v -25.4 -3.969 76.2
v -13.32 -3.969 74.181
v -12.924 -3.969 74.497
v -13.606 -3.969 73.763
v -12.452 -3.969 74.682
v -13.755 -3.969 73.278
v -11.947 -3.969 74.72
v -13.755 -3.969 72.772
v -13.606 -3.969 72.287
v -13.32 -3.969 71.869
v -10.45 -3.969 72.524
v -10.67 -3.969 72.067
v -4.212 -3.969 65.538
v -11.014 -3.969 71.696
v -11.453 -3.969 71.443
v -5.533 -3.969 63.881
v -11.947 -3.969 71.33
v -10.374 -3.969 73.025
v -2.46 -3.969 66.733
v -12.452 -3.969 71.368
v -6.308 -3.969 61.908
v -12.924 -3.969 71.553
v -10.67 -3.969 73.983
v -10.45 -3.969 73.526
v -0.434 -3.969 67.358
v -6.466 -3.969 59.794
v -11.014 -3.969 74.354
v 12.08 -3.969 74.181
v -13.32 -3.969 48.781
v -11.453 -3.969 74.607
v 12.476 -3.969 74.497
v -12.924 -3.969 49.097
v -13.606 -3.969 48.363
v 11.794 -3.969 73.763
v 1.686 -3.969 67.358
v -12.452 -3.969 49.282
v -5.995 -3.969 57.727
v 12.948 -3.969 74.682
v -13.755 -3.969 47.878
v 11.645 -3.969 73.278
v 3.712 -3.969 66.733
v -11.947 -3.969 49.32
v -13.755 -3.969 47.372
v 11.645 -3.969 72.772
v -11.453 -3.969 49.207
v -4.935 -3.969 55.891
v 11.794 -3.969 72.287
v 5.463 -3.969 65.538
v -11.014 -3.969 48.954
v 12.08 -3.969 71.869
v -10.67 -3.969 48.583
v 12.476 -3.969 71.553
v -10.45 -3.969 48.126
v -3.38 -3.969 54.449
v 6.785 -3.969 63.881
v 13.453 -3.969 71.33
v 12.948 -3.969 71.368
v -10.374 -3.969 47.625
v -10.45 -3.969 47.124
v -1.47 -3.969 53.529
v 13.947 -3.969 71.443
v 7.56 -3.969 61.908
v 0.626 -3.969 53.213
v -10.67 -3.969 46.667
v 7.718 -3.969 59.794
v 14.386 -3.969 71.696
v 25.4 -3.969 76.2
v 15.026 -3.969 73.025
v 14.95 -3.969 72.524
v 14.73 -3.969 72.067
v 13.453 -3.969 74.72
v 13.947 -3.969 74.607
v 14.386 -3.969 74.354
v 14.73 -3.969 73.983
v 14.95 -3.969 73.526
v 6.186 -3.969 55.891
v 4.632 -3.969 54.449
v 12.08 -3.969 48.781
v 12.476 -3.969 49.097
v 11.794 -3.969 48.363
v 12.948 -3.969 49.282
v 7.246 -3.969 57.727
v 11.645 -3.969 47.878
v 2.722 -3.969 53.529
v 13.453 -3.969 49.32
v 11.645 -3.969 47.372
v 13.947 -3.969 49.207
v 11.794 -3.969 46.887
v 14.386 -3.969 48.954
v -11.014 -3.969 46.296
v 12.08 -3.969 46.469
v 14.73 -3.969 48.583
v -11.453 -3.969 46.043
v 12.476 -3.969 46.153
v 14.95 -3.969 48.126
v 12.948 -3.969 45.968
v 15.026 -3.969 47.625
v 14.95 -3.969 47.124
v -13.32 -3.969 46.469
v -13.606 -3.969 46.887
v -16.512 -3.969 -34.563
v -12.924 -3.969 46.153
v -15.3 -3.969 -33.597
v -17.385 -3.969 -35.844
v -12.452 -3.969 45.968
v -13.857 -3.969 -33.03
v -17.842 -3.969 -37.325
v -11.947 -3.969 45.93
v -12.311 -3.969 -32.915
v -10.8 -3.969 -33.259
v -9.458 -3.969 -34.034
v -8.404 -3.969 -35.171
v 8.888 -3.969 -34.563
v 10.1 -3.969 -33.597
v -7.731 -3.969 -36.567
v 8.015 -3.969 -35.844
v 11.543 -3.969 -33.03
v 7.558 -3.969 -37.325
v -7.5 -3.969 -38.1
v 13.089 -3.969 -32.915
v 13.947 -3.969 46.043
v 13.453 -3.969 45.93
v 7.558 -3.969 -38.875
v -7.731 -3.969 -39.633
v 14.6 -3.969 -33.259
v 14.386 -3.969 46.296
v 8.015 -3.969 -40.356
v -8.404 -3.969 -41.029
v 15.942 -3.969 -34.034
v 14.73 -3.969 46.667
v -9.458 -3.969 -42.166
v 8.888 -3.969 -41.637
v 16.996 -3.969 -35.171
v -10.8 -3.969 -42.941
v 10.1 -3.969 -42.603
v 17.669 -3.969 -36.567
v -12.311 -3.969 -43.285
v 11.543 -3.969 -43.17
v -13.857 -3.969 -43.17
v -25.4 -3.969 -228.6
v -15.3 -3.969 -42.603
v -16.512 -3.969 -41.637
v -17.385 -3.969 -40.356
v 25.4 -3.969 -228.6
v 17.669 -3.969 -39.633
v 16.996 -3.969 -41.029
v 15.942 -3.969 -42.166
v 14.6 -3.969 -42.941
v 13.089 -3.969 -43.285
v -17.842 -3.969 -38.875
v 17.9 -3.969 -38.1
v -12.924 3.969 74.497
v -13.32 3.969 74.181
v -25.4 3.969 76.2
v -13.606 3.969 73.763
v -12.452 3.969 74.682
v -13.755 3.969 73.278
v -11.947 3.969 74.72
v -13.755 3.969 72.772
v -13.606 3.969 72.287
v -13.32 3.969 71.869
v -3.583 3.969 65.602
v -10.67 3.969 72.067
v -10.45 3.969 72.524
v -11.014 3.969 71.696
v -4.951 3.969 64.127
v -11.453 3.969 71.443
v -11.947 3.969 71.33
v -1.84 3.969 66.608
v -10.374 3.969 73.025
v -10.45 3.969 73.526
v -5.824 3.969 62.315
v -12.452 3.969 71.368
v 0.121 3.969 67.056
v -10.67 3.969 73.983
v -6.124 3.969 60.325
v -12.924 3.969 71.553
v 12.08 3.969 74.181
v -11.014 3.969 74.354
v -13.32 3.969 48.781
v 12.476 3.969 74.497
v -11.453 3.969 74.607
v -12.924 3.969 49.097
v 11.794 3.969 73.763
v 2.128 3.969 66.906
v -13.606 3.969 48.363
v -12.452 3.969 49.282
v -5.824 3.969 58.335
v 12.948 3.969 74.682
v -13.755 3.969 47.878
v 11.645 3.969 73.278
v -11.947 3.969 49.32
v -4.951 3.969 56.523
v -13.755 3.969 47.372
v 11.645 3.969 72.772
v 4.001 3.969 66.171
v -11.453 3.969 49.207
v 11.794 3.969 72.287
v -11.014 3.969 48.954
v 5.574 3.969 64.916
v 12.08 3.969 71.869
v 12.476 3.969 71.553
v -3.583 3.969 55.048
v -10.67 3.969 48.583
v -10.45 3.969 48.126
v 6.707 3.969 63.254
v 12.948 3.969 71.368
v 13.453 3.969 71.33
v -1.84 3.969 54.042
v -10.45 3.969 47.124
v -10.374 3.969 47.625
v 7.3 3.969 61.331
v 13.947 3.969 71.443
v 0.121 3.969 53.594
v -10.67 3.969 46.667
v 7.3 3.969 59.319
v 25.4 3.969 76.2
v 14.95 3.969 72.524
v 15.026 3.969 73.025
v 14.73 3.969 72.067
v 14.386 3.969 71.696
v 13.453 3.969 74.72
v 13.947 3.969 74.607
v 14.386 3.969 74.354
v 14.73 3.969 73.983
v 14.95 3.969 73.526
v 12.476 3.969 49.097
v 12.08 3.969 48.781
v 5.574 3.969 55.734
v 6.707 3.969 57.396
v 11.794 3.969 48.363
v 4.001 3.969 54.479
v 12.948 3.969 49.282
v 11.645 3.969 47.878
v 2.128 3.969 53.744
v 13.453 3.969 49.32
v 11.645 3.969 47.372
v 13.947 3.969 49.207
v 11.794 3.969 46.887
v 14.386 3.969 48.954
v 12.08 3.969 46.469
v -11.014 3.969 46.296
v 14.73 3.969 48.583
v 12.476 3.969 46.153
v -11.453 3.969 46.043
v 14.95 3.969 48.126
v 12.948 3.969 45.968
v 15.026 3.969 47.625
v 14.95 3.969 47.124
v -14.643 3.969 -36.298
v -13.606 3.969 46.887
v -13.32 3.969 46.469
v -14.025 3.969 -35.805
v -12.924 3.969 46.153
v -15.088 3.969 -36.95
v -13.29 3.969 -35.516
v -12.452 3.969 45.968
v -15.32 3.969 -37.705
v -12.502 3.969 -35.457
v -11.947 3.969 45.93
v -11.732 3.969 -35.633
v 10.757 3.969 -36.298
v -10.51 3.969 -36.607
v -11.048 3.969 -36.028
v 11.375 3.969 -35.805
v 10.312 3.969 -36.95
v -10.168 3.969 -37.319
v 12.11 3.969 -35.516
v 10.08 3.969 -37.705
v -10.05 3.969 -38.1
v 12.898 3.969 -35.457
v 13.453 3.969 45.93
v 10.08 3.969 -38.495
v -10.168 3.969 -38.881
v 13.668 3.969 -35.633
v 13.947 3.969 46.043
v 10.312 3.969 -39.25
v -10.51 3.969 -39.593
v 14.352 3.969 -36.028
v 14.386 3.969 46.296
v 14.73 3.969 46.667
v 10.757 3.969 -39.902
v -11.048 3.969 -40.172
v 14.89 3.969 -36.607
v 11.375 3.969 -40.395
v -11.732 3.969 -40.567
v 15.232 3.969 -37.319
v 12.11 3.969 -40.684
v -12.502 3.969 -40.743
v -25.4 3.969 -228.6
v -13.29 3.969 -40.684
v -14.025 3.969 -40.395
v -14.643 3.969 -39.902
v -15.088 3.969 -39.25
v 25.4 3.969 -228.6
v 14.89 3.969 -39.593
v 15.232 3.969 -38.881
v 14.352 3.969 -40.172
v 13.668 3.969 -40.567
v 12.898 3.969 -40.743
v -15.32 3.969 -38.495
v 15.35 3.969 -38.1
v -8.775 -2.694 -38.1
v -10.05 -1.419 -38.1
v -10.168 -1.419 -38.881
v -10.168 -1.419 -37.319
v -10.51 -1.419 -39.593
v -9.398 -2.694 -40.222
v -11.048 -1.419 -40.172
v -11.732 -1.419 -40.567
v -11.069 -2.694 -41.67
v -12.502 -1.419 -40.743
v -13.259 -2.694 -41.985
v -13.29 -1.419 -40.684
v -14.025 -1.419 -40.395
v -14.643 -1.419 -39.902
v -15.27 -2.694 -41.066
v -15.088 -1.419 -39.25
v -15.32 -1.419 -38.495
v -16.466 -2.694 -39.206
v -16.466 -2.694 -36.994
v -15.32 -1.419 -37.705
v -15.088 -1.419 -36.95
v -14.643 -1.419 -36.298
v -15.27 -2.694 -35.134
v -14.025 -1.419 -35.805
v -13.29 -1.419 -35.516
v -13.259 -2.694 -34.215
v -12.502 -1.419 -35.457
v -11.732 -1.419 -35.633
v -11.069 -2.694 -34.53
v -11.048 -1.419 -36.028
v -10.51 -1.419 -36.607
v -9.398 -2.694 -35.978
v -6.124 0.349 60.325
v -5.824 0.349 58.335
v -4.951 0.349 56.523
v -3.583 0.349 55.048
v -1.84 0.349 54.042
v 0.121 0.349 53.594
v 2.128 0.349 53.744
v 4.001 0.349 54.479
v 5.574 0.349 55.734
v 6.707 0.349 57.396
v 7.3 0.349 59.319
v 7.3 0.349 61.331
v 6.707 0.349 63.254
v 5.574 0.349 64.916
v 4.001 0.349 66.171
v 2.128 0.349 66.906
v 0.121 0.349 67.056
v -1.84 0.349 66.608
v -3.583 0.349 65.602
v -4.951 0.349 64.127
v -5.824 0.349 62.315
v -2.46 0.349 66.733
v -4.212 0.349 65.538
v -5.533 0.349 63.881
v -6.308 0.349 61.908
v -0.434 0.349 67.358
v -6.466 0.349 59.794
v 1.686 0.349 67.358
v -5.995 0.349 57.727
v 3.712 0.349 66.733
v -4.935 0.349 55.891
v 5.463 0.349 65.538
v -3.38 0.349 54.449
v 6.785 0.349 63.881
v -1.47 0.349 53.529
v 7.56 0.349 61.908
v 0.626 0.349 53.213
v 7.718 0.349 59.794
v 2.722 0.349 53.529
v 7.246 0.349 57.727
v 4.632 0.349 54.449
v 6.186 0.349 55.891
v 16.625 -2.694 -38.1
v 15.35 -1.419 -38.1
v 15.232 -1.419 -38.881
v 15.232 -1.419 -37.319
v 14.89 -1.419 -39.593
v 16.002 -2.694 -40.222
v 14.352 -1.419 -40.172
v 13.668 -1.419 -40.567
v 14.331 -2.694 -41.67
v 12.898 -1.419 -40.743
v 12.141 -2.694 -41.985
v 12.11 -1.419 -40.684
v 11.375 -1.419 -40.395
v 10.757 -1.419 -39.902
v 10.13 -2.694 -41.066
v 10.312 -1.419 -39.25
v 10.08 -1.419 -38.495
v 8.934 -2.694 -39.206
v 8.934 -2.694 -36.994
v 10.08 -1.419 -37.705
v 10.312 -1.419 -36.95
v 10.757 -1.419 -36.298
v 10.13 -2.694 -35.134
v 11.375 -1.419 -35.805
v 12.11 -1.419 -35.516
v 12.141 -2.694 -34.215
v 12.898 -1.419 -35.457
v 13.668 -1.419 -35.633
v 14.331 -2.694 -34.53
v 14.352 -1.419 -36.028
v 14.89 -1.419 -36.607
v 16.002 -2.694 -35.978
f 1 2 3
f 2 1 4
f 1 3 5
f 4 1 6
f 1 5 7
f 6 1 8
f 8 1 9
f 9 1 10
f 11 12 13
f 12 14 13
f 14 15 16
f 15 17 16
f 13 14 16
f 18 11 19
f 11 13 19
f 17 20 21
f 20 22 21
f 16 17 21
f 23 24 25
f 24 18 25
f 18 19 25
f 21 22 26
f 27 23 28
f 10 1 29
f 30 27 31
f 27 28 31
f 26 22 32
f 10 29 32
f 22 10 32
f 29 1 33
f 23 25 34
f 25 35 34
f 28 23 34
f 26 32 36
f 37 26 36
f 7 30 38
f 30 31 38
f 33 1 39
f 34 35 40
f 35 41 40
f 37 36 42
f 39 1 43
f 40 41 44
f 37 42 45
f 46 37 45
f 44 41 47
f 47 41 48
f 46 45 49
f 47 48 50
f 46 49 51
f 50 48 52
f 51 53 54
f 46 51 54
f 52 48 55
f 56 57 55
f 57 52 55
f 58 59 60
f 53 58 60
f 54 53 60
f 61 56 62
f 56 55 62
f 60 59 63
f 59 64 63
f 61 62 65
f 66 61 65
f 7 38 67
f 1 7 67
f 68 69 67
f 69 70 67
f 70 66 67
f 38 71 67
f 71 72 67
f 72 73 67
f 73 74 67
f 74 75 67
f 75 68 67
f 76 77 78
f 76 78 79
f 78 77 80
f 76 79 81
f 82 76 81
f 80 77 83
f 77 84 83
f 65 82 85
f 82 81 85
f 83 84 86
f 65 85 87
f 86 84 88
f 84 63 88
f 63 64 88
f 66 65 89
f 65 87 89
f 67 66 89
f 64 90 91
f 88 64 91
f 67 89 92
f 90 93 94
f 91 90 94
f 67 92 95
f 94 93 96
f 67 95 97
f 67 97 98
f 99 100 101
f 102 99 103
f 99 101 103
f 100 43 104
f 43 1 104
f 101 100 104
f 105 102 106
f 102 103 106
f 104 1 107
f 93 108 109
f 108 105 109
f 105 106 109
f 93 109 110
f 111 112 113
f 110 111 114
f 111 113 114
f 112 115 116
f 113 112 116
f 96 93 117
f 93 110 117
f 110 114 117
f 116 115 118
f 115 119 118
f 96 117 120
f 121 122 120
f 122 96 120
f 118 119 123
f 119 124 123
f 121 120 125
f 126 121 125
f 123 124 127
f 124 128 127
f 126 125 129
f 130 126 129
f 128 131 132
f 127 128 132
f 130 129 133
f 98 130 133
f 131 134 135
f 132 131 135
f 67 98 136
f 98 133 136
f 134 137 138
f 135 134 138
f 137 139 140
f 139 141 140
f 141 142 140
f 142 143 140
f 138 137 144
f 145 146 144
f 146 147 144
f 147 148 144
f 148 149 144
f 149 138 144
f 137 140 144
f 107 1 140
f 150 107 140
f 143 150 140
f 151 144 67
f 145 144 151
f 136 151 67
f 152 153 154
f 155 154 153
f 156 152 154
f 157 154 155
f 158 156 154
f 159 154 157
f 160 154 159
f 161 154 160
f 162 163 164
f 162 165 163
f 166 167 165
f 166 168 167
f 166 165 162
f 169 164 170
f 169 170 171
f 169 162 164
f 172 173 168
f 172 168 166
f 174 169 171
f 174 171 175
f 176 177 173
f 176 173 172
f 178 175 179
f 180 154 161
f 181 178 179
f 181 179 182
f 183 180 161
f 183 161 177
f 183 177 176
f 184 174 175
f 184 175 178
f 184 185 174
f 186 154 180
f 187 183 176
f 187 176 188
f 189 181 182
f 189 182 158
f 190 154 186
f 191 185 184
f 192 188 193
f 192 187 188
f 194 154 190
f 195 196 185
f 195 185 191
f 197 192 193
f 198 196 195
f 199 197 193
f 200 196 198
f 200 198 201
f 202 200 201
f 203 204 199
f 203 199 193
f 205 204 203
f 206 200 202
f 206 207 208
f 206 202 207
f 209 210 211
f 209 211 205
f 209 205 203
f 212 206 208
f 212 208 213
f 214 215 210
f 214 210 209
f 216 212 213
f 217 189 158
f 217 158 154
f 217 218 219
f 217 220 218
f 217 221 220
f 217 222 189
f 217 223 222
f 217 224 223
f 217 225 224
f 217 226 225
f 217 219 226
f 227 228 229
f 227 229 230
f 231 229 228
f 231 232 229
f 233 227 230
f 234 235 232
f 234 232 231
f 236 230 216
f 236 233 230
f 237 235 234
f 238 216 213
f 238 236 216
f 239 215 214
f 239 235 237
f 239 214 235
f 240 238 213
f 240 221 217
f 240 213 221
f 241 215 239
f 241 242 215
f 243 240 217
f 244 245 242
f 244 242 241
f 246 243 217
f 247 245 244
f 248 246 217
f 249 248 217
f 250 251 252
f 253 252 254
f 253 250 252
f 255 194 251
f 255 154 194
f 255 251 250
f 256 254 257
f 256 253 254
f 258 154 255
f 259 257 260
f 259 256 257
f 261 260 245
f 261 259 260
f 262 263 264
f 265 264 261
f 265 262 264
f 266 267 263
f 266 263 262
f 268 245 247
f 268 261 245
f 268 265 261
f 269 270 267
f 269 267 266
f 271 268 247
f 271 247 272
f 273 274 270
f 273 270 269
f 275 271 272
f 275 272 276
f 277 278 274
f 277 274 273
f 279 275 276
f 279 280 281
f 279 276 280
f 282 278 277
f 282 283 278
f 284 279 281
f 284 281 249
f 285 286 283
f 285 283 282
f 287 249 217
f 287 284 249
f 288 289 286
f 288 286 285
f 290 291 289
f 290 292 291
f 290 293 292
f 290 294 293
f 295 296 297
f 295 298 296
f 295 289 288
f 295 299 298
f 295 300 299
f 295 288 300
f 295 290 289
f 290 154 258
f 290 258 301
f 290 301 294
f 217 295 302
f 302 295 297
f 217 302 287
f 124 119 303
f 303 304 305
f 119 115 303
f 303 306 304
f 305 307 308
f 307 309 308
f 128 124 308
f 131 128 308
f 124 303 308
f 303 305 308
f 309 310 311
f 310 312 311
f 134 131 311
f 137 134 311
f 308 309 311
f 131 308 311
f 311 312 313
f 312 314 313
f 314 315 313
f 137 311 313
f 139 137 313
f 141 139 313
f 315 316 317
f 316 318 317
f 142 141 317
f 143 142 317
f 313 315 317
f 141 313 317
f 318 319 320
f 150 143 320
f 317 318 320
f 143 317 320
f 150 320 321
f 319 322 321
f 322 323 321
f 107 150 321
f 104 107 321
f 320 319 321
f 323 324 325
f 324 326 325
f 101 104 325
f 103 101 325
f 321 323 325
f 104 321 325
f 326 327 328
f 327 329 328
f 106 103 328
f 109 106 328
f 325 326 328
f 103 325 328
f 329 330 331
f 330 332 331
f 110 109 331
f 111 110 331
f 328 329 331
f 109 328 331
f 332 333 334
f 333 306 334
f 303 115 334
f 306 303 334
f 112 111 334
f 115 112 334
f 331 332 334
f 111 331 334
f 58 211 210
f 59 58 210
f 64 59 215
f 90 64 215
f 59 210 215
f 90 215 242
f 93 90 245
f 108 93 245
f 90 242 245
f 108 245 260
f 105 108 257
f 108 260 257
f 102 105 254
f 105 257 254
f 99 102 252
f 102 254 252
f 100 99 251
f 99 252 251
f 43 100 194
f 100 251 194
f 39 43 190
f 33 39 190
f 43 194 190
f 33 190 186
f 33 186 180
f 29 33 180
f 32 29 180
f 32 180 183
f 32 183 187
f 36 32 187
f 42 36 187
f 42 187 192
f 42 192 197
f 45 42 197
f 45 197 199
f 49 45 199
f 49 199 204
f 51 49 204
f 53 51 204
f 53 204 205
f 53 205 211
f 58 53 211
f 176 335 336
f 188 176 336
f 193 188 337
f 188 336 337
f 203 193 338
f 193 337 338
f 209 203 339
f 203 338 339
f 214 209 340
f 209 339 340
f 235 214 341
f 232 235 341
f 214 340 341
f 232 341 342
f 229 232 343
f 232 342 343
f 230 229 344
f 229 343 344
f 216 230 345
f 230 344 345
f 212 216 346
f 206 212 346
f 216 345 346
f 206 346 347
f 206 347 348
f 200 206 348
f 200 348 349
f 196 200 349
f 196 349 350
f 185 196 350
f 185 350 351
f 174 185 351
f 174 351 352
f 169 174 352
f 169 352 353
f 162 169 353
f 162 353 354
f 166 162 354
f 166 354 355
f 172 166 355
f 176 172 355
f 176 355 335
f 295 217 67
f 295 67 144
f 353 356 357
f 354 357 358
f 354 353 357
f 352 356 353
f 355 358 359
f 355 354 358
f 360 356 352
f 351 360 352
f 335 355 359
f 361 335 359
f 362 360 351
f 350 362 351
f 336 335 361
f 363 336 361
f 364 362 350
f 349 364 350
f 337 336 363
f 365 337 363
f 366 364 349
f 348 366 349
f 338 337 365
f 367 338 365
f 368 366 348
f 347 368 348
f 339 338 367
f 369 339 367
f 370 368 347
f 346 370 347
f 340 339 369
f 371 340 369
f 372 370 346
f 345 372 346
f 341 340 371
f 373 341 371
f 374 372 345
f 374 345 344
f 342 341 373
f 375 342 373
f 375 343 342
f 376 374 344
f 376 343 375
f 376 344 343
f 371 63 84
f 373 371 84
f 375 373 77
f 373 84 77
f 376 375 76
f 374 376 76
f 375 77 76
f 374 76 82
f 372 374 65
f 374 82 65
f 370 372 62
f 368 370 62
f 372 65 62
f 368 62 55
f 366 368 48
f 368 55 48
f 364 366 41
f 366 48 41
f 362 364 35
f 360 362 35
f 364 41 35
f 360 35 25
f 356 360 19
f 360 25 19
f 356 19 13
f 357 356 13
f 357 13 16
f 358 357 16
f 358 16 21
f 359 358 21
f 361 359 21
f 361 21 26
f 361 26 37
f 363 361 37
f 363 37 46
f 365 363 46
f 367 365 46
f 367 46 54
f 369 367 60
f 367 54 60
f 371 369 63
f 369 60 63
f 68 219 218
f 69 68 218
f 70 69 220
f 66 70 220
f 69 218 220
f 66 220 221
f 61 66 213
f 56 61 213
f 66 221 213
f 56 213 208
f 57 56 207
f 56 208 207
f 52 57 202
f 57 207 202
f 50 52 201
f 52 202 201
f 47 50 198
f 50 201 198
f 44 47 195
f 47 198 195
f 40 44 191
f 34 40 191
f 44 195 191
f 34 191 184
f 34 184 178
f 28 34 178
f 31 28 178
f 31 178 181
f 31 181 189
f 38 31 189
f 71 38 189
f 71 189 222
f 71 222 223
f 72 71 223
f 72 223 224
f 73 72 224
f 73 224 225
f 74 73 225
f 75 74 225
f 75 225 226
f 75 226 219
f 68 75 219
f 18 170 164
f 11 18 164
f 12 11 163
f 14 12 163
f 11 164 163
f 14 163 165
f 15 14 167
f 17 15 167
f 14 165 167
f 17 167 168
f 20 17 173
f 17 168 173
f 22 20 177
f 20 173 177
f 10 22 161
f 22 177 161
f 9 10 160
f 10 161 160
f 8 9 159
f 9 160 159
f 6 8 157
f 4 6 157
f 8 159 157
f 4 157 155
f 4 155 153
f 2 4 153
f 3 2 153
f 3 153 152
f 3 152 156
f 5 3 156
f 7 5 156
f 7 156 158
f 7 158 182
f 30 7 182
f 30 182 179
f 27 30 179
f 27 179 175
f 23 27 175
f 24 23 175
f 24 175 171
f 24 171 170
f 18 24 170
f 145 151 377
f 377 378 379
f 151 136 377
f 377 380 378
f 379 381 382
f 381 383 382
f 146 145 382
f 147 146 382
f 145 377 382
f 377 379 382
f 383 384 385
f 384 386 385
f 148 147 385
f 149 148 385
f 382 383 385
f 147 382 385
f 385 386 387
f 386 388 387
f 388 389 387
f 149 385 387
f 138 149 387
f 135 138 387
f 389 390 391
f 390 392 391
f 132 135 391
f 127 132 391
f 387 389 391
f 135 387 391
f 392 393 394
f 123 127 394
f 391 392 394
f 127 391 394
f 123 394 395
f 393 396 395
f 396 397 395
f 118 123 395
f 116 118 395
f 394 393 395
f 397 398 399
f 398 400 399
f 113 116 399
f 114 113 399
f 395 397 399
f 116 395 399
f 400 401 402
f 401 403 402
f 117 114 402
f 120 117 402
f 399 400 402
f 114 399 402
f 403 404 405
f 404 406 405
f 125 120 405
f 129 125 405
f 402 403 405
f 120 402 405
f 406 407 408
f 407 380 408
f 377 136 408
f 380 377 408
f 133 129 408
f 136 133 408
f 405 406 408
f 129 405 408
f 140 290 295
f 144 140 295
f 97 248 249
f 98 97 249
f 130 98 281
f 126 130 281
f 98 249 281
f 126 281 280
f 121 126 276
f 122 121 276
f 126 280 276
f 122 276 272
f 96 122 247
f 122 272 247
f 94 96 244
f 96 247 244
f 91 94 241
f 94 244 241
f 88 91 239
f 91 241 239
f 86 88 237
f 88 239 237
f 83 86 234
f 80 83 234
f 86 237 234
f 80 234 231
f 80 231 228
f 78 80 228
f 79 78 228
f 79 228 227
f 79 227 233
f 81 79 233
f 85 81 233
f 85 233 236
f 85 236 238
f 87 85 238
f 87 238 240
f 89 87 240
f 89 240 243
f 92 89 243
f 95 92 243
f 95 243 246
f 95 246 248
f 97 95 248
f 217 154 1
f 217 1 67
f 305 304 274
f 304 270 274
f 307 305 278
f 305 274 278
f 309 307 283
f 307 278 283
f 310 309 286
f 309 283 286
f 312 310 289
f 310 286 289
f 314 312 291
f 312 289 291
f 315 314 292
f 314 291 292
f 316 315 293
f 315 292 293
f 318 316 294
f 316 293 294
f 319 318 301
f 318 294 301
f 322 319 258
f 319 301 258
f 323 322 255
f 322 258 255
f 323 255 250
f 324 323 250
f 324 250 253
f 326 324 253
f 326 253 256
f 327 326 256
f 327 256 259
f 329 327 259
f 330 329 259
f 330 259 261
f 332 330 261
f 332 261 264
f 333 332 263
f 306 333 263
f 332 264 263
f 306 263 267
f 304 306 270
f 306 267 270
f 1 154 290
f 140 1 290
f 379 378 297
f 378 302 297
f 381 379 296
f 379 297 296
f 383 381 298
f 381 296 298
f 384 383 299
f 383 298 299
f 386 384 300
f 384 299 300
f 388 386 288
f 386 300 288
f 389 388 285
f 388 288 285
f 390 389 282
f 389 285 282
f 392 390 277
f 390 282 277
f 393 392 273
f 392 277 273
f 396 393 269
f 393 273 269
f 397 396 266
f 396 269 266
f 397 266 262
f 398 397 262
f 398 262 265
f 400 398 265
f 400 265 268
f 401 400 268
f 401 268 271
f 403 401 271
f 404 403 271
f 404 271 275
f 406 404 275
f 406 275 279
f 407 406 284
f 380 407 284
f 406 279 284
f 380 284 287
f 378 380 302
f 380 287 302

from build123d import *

# Parameters (mm, degrees)
BOSS_EXTRUDE1_DEPTH                             = 76.2
BOSS_EXTRUDE1_DEPTH_BACK                        = 76.2
SKETCH3_W                                       = 50.8
SKETCH3_H                                       = 7.9375
M12_CLEARANCE_HOLE2_D                           = 13.5
CSK_FOR_M5_FLAT_HEAD_MACHINE_SCREW1_D           = 5.3
CSK_FOR_M5_FLAT_HEAD_MACHINE_SCREW1_CSINK_D     = 10.4
CSK_FOR_M5_FLAT_HEAD_MACHINE_SCREW1_CSINK_ANGLE = 90
SKETCH26_W                                      = 50.8
SKETCH26_H                                      = 152.4
BOSS_EXTRUDE2_DEPTH                             = 7.9375
SKETCH27_R                                      = 7.112
CUT_EXTRUDE2_DEPTH                              = 4.318
M3_CLEARANCE_HOLE1_D                            = 3.4
M3_CLEARANCE_HOLE1_DEPTH                        = 15.24
M3_CLEARANCE_HOLE1_TIP                          = 1.021463052


with BuildPart() as part:
    # Sketch3 → Boss-Extrude1 (new, two sides: drawn at the far end of the back side and taken through both)
    with BuildSketch(Plane.XY.offset(-BOSS_EXTRUDE1_DEPTH_BACK)):
        Rectangle(SKETCH3_W, SKETCH3_H)
    extrude(amount=BOSS_EXTRUDE1_DEPTH + BOSS_EXTRUDE1_DEPTH_BACK)

    # M12 Clearance Hole2 (through all)
    with Locations(Plane(origin=(0, 3.96875, 0), x_dir=(1, 0, 0), z_dir=(0, 1, 0))):
        with Locations((0.625840615, -60.325)):
            Hole(M12_CLEARANCE_HOLE2_D / 2)

    # CSK for M5 Flat Head Machine Screw1 (through all)
    with Locations(Plane(origin=(0, -3.96875, 0), x_dir=(-1, 0, 0), z_dir=(0, -1, 0))):
        with Locations((-12.7, 38.1), (12.7, 38.1)):
            CounterSinkHole(CSK_FOR_M5_FLAT_HEAD_MACHINE_SCREW1_D / 2, CSK_FOR_M5_FLAT_HEAD_MACHINE_SCREW1_CSINK_D / 2, counter_sink_angle=CSK_FOR_M5_FLAT_HEAD_MACHINE_SCREW1_CSINK_ANGLE)

    # Sketch26 → Boss-Extrude2 (add)
    with BuildSketch(Plane(origin=(0, 3.96875, 0), x_dir=(1, 0, 0), z_dir=(0, 1, 0))):
        with Locations((0, 152.4)):
            Rectangle(SKETCH26_W, SKETCH26_H)
    extrude(amount=-BOSS_EXTRUDE2_DEPTH)

    # Sketch27 → Cut-Extrude2 (cut)
    with BuildSketch(Plane.XZ.offset(3.96875)):
        with Locations(Location((0.625840615, 60.325, 0), (0, 0, 270))):
            Circle(SKETCH27_R)
    extrude(amount=-CUT_EXTRUDE2_DEPTH, mode=Mode.SUBTRACT)

    # M3 Clearance Hole1
    with Locations(Plane(origin=(0, -3.96875, 0), x_dir=(-1, 0, 0), z_dir=(0, -1, 0))):
        with Locations((-13.325840615, -47.625), (-13.325840615, -73.025), (12.074159385, -73.025), (12.074159385, -47.625)):
            Hole(M3_CLEARANCE_HOLE1_D / 2, depth=M3_CLEARANCE_HOLE1_DEPTH)
            with Locations((0, 0, -(M3_CLEARANCE_HOLE1_DEPTH + M3_CLEARANCE_HOLE1_TIP / 2))):  # 118° drill point
                Cone(0, M3_CLEARANCE_HOLE1_D / 2, M3_CLEARANCE_HOLE1_TIP, mode=Mode.SUBTRACT)


solid = part.part
